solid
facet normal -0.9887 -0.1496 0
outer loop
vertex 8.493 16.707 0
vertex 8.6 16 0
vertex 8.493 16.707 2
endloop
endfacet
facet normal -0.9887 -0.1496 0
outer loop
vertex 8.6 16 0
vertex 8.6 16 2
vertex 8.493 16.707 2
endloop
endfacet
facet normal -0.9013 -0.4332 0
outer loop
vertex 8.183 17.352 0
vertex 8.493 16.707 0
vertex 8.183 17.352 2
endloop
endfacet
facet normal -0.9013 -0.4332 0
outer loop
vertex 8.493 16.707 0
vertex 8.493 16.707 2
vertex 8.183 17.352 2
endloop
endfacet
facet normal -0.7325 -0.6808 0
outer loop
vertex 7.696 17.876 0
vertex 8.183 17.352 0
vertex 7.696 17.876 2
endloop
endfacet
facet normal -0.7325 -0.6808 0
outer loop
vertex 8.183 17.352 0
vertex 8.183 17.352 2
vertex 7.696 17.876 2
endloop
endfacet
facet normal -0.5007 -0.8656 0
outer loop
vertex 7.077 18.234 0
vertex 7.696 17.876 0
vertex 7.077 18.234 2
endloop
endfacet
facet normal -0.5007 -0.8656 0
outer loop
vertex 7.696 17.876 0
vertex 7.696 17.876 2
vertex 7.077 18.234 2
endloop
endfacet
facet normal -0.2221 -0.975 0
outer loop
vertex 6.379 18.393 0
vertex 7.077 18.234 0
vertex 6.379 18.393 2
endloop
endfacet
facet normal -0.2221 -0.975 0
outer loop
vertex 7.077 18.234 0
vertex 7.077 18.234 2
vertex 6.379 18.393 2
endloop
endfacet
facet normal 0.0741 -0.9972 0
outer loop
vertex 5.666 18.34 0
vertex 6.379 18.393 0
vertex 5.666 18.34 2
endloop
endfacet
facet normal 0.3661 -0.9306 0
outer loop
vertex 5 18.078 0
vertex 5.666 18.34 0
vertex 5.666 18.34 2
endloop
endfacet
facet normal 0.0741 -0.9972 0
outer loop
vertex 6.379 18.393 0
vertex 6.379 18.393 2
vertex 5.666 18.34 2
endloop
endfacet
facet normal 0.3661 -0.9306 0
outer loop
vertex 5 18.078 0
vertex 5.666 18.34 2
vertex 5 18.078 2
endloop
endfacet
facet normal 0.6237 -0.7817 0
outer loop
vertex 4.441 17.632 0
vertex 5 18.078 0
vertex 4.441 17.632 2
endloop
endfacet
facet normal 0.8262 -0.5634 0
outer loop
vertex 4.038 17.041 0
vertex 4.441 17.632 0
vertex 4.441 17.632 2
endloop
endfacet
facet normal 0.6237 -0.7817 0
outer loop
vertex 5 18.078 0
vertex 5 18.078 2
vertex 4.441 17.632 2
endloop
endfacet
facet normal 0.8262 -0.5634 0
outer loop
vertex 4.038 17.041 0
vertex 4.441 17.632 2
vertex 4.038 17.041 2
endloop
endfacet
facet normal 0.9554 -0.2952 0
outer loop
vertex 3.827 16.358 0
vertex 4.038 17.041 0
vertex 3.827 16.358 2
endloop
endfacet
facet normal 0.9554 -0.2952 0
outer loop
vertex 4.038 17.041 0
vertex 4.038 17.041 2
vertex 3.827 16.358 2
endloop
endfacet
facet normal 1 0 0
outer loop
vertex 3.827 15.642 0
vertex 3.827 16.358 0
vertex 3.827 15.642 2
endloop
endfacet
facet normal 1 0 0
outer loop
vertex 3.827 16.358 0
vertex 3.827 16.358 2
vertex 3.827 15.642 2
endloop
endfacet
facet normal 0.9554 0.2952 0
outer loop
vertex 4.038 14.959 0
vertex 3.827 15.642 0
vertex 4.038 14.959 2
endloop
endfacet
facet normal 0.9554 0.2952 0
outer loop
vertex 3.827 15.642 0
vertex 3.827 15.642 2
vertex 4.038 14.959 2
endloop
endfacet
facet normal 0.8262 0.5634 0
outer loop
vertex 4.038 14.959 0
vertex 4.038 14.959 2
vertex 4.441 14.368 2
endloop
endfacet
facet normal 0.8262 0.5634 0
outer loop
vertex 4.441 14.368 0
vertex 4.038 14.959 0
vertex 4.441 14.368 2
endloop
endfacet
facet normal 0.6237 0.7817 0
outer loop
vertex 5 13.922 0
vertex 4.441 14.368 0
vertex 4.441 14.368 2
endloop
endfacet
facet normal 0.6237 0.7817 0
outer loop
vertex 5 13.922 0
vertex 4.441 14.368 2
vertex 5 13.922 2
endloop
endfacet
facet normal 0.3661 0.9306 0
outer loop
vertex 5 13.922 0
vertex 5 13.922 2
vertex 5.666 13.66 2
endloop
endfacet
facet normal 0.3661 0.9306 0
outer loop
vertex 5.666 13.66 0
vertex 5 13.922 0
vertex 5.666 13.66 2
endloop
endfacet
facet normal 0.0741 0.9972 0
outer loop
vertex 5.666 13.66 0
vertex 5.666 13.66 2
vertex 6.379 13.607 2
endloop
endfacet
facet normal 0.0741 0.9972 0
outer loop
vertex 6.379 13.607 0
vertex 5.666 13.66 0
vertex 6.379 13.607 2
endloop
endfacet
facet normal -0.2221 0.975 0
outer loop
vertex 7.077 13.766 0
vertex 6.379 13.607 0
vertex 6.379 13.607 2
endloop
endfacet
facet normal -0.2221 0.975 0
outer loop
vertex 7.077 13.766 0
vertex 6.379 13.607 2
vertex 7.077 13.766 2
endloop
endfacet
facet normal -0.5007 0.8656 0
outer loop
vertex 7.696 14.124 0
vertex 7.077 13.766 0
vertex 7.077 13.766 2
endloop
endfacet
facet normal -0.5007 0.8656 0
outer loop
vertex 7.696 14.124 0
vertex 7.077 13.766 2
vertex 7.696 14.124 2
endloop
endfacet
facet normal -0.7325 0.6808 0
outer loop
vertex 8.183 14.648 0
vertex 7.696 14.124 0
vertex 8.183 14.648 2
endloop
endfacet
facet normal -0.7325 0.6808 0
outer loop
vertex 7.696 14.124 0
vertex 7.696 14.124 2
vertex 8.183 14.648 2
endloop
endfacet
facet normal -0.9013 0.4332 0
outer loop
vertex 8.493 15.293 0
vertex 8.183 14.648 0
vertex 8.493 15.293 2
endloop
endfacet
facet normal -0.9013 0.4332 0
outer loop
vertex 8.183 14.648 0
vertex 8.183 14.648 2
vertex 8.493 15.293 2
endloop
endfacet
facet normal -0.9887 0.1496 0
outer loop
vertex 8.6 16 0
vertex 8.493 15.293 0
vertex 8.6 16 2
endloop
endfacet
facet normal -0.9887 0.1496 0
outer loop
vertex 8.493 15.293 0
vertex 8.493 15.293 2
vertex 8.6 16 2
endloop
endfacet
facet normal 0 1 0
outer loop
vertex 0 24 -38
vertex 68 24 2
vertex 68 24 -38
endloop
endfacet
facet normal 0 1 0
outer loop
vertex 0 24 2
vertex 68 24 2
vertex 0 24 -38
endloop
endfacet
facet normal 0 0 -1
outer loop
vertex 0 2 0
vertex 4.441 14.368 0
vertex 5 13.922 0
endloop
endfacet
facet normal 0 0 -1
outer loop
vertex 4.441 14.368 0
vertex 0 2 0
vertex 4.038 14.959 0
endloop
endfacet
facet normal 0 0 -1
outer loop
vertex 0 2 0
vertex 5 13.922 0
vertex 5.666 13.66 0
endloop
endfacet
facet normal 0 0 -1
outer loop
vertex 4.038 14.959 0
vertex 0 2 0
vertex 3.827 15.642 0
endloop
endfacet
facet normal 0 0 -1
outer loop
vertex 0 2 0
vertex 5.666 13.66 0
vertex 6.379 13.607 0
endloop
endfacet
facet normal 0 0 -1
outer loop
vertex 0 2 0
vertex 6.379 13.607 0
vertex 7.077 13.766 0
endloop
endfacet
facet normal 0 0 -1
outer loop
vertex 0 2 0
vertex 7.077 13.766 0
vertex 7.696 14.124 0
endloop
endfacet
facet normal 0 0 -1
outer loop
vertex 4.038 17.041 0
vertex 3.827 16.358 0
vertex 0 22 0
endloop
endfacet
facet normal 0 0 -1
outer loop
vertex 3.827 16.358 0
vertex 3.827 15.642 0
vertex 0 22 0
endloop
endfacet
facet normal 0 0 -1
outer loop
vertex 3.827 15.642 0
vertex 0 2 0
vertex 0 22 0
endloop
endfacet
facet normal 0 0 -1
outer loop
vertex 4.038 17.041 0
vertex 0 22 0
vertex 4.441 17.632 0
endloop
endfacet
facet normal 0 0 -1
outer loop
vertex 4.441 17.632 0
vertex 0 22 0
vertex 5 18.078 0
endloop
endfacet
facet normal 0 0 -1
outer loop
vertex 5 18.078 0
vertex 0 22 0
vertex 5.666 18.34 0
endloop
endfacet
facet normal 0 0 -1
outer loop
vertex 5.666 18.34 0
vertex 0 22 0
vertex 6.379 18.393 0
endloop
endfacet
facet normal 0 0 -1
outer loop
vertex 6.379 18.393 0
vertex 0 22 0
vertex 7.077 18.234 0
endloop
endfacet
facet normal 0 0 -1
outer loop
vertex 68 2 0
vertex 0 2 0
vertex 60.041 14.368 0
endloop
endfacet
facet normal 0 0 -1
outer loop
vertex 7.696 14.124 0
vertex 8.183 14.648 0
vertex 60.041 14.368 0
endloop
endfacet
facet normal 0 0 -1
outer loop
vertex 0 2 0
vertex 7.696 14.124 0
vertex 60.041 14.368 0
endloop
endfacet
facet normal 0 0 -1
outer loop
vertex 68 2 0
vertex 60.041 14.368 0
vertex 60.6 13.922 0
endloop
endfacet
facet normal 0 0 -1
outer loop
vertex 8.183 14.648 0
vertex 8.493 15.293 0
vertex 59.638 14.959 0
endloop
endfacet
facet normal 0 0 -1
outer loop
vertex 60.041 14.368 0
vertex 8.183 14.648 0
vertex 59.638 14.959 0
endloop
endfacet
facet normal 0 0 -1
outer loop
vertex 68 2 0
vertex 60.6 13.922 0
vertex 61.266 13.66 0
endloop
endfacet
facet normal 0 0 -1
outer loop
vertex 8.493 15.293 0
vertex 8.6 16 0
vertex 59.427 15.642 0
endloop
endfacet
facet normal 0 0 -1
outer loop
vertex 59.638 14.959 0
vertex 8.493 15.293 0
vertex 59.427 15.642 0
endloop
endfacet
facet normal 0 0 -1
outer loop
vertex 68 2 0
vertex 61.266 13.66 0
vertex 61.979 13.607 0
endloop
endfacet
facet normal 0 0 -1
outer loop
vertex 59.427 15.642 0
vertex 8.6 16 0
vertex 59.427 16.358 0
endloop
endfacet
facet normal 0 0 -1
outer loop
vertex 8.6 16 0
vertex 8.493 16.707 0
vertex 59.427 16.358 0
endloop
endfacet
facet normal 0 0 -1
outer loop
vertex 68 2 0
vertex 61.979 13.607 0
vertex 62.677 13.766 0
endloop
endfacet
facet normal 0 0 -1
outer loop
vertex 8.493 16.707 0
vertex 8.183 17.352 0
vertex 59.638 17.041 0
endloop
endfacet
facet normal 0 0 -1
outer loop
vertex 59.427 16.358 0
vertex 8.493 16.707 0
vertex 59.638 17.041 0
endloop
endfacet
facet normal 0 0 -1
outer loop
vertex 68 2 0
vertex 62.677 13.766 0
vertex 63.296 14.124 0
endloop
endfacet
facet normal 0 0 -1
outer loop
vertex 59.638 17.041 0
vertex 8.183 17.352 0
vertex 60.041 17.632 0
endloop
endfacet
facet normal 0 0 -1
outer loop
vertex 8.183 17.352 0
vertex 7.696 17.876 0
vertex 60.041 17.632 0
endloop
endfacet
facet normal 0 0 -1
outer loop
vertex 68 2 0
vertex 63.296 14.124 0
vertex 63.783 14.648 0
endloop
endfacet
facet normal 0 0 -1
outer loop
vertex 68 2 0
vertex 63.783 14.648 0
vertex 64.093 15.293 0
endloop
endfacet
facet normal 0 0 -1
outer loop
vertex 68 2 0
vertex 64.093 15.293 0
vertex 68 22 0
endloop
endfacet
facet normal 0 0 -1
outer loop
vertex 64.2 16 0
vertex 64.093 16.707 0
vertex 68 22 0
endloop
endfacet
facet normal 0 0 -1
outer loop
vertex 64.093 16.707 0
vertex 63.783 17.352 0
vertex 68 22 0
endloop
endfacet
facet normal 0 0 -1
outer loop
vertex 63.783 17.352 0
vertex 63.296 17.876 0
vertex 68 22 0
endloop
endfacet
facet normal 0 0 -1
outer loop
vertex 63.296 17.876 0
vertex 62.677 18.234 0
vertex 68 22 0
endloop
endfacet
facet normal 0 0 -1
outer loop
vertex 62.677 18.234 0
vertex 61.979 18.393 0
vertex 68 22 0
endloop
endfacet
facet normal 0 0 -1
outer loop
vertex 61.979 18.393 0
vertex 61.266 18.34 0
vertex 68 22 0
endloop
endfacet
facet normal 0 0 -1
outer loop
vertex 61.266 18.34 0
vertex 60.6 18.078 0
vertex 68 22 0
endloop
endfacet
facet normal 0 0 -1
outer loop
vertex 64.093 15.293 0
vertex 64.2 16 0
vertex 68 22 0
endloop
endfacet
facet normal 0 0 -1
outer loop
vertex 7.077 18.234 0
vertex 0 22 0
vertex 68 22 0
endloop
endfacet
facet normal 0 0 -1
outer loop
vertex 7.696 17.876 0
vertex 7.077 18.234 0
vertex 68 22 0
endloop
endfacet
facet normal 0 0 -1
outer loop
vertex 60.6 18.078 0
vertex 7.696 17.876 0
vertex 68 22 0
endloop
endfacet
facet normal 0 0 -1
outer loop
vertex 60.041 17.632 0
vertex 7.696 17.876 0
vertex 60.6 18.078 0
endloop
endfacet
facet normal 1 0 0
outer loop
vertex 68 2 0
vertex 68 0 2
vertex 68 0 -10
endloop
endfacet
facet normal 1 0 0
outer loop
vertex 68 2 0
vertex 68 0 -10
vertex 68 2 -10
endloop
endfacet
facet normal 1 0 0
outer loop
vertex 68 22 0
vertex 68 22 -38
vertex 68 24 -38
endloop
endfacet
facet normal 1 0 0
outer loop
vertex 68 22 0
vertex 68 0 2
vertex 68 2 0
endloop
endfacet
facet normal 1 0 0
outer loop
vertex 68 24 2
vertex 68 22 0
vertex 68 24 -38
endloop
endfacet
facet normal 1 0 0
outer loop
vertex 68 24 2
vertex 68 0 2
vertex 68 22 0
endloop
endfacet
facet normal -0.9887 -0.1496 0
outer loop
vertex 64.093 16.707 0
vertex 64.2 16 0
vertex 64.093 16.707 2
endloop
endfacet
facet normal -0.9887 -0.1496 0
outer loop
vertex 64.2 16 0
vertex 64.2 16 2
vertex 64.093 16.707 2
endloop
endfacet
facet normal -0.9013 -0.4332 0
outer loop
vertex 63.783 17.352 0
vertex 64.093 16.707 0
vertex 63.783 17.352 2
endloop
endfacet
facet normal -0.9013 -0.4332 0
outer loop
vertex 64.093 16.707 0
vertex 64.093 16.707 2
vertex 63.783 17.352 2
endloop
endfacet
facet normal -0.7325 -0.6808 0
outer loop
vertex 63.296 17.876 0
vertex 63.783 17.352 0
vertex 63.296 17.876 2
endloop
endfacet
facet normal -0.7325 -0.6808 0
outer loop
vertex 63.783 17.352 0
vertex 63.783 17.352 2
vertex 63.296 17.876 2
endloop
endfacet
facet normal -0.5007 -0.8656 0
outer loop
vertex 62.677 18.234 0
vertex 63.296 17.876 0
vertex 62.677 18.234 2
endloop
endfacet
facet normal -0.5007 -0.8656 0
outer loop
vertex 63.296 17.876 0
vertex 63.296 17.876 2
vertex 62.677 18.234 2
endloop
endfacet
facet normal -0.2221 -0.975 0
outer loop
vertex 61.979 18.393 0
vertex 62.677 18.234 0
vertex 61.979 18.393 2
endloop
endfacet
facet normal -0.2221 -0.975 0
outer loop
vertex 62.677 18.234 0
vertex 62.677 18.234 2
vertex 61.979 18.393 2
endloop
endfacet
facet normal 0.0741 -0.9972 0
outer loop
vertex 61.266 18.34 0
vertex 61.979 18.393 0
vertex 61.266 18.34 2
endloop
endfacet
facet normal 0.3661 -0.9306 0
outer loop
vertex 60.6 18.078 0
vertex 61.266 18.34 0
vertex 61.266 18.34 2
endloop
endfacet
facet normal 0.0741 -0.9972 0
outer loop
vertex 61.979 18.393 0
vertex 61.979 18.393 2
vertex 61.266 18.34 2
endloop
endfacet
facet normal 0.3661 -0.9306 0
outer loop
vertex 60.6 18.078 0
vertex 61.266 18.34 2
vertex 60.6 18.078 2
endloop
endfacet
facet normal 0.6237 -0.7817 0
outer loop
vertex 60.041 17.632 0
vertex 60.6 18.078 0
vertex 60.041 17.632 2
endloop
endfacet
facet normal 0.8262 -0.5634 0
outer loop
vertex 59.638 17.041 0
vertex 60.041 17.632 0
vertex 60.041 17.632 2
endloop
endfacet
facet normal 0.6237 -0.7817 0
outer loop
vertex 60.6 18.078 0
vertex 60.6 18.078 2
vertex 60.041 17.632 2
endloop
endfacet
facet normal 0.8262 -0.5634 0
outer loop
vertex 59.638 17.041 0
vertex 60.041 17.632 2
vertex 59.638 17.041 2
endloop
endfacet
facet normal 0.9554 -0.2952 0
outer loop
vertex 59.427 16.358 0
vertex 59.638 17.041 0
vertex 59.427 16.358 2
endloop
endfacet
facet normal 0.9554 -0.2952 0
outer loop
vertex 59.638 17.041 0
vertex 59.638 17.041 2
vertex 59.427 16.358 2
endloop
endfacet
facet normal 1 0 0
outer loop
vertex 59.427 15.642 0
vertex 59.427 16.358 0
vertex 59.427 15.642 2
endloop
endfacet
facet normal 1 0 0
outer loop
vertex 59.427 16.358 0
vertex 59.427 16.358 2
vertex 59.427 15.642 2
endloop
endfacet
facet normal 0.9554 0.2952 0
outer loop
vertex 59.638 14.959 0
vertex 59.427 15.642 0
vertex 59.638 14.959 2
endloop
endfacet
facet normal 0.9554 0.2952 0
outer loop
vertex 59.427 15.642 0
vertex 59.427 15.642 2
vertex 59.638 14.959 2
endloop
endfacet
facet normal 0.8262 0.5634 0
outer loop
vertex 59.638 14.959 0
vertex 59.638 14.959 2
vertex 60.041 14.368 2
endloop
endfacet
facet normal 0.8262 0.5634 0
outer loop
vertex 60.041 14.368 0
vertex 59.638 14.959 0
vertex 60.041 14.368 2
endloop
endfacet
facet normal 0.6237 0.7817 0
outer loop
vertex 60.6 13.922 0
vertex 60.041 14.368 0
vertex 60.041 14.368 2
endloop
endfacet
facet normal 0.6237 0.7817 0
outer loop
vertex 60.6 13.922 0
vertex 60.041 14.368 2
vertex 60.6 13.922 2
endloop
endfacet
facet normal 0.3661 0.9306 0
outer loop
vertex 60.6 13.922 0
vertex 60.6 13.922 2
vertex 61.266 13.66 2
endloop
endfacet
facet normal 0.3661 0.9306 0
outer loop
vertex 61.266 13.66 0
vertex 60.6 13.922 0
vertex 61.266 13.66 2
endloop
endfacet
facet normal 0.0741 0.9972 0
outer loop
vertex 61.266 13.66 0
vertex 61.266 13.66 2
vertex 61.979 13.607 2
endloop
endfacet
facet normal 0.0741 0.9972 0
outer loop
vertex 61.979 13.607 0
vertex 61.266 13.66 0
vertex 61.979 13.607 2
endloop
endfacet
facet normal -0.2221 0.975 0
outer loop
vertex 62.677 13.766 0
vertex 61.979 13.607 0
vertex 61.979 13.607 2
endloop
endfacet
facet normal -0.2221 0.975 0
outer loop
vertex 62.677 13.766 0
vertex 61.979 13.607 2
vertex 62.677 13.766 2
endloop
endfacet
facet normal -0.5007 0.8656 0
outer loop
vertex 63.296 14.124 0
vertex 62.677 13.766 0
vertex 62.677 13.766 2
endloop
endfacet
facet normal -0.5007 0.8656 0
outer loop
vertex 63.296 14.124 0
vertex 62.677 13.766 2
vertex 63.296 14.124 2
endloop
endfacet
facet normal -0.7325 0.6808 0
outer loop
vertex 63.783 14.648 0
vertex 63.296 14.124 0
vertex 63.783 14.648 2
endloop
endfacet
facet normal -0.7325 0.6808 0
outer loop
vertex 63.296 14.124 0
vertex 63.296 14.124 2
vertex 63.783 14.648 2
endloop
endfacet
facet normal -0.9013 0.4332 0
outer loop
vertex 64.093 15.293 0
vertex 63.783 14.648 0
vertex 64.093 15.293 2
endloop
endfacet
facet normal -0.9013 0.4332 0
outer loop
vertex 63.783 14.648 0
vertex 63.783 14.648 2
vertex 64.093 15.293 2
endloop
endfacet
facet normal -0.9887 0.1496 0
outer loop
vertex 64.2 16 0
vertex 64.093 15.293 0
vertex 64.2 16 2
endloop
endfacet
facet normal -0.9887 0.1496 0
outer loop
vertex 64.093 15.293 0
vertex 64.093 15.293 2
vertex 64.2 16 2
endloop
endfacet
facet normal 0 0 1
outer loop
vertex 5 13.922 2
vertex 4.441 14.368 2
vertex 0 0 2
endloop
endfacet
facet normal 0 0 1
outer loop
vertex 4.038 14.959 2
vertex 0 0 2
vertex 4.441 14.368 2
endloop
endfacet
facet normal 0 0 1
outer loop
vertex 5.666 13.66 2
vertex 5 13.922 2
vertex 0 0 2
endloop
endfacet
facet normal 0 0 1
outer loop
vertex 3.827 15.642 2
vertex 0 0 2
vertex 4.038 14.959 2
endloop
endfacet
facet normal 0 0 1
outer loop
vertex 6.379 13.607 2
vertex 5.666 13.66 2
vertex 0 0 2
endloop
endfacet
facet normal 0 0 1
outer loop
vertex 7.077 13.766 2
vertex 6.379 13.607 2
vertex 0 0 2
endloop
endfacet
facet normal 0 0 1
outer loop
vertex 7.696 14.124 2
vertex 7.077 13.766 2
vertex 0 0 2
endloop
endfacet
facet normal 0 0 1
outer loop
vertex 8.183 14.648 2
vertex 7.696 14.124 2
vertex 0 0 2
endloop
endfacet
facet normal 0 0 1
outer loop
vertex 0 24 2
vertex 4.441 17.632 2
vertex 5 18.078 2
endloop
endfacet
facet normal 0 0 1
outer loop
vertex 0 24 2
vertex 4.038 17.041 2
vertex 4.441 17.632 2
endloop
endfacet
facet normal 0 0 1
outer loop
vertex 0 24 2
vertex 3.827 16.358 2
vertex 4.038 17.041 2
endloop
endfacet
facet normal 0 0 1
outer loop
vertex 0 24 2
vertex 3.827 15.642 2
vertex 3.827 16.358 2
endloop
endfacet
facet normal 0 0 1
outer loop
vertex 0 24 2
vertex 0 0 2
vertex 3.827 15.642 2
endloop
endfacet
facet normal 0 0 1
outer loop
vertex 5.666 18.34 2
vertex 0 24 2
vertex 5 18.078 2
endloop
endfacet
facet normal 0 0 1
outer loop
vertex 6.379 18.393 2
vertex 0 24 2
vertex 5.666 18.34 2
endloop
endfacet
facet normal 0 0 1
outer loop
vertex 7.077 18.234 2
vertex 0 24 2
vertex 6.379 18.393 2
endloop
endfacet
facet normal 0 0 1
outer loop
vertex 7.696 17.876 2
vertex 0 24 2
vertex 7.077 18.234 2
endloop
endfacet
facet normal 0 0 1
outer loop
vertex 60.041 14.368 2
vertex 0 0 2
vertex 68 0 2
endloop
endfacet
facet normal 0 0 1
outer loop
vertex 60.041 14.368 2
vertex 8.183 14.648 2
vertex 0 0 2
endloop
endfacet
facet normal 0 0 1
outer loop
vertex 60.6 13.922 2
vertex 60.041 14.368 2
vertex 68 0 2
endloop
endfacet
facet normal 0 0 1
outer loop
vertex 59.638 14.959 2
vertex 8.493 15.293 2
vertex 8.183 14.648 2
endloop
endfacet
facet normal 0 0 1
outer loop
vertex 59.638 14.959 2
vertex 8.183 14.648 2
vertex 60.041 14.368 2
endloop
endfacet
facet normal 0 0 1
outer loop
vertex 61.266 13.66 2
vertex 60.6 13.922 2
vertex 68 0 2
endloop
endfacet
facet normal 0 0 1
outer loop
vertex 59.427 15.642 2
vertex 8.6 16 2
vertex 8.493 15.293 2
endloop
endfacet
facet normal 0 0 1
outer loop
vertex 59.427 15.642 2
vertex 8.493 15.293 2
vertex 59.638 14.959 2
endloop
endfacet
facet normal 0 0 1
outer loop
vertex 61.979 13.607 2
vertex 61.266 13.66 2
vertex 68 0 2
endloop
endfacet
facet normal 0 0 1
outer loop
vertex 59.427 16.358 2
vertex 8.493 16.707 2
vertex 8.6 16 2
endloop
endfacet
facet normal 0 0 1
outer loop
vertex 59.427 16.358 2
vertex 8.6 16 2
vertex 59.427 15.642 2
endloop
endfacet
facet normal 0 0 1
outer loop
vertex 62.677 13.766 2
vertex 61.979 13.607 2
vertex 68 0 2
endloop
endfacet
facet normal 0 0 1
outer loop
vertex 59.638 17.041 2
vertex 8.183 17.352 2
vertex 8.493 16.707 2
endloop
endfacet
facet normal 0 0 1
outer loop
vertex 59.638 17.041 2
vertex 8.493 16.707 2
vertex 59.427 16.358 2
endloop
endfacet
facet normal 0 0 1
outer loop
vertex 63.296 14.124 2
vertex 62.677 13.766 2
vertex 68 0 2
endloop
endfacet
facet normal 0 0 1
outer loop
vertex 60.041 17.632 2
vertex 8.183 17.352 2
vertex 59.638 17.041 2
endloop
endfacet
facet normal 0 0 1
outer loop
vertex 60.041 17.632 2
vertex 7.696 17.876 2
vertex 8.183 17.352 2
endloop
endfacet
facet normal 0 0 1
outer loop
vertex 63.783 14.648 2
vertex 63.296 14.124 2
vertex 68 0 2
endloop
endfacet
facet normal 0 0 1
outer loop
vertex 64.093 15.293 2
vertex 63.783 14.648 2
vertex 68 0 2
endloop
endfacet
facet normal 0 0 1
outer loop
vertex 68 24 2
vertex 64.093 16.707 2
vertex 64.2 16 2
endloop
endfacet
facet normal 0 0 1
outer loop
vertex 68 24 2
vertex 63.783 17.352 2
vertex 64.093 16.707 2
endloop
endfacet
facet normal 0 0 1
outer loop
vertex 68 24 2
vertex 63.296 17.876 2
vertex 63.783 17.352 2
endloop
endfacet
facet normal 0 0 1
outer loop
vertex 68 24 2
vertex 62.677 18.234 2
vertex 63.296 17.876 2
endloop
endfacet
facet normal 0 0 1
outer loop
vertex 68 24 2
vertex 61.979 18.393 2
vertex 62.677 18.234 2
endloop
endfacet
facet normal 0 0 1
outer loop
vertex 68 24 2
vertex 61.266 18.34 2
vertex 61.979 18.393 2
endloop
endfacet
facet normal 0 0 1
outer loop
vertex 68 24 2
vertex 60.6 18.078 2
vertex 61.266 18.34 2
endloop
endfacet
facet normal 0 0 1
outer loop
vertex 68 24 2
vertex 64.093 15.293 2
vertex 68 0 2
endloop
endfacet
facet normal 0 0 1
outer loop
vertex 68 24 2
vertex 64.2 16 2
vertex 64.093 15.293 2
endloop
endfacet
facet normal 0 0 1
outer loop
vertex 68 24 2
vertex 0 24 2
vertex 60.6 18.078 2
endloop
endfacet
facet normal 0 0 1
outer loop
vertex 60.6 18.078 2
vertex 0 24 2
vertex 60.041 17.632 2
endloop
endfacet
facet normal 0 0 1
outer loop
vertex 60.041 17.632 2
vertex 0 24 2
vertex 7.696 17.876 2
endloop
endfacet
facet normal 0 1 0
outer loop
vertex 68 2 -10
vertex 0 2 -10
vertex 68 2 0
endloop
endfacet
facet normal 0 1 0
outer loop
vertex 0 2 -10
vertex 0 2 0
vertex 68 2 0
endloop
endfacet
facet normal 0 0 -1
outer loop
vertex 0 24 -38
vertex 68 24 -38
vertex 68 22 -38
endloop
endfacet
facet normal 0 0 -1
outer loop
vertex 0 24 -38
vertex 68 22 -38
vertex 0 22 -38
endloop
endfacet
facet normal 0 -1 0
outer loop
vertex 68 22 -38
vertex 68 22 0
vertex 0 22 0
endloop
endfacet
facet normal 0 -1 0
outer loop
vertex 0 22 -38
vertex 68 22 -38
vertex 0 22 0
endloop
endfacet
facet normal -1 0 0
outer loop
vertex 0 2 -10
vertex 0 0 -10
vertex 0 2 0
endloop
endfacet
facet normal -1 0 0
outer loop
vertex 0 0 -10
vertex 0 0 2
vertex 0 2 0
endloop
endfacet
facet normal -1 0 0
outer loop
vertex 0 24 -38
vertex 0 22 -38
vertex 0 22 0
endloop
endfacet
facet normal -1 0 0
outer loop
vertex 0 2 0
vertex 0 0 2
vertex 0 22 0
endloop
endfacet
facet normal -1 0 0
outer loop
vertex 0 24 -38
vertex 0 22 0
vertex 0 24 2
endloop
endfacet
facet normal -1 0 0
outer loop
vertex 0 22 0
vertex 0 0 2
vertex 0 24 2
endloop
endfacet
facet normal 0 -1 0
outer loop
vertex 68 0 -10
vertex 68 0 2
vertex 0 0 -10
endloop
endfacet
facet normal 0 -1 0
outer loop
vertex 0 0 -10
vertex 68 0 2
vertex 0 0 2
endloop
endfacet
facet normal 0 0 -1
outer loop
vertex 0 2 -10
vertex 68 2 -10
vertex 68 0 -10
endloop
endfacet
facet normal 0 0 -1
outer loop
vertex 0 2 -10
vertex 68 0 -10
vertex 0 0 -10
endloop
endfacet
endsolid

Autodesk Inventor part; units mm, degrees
ref_plane "YZ Plane" through (0, 0, 0) normal (1, 0, 0) x (0, 1, 0)
ref_plane "XZ Plane" through (0, 0, 0) normal (0, 1, 0) x (-1, 0, 0)
ref_plane "XY Plane" through (0, 0, 0) normal (0, 0, 1) x (1, 0, 0)
sketch "Sketch1" plane through (0, 0, 0) normal (0, 0, 1) x (1, 0, 0)
  line L0 (0, 0) -> (68, 0)
  line L1 (68, 0) -> (68, 24)
  line L2 (68, 24) -> (0, 24)
  line L3 (0, 24) -> (0, 0)
  dimension "d0" = 68
  dimension "d1" = 24
extrude "Extrusion1" add sketch "Sketch1" along normal blind 2
sketch "Sketch2" plane through (0, 0, 2) normal (0, 0, 1) x (1, 0, 0)
  circle A0 centre (6.2, 16) radius 2.4
  circle A1 centre (61.8, 16) radius 2.4
  line L0 (68, 24) -> (0, 24) projected
  line L1 (34, 24) -> (34, 0) construction
  line L2 (0, 0) -> (68, 0) projected
  dimension "d4" = 4.8
  dimension "d5" = 4.8
  dimension "d6" = 55.6
  dimension "d7" = 27.8
  dimension "d8" = 8
extrude "Extrusion2" cut sketch "Sketch2" against normal blind 2
sketch "Sketch3" plane through (0, 0, 0) normal (0, 0, -1) x (-1, 0, 0)
  line L0 (-68, 24) -> (0, 24) projected
  line L1 (-68, 0) -> (-68, 24) projected
  line L2 (0, 24) -> (-68, 24)
  line L3 (-68, 24) -> (-68, 22)
  line L4 (-68, 22) -> (0, 22)
  line L5 (0, 22) -> (0, 24)
  point P0 (0, 0)
  dimension "d11" = 2
extrude "Extrusion3" add sketch "Sketch3" along normal blind 38
sketch "Sketch4" plane through (0, 0, 0) normal (0, 0, -1) x (-1, 0, 0)
  line L0 (-68, 0) -> (-68, 24) projected
  line L1 (-68, 0) -> (0, 0)
  line L2 (0, 0) -> (0, 2)
  line L3 (0, 2) -> (-68, 2)
  line L4 (-68, 2) -> (-68, 0)
  line L5 (0, 22) -> (0, 0) projected
  dimension "d14" = 2
extrude "Extrusion4" add sketch "Sketch4" along normal blind 10
properties part number "MainsCoverInternal"
